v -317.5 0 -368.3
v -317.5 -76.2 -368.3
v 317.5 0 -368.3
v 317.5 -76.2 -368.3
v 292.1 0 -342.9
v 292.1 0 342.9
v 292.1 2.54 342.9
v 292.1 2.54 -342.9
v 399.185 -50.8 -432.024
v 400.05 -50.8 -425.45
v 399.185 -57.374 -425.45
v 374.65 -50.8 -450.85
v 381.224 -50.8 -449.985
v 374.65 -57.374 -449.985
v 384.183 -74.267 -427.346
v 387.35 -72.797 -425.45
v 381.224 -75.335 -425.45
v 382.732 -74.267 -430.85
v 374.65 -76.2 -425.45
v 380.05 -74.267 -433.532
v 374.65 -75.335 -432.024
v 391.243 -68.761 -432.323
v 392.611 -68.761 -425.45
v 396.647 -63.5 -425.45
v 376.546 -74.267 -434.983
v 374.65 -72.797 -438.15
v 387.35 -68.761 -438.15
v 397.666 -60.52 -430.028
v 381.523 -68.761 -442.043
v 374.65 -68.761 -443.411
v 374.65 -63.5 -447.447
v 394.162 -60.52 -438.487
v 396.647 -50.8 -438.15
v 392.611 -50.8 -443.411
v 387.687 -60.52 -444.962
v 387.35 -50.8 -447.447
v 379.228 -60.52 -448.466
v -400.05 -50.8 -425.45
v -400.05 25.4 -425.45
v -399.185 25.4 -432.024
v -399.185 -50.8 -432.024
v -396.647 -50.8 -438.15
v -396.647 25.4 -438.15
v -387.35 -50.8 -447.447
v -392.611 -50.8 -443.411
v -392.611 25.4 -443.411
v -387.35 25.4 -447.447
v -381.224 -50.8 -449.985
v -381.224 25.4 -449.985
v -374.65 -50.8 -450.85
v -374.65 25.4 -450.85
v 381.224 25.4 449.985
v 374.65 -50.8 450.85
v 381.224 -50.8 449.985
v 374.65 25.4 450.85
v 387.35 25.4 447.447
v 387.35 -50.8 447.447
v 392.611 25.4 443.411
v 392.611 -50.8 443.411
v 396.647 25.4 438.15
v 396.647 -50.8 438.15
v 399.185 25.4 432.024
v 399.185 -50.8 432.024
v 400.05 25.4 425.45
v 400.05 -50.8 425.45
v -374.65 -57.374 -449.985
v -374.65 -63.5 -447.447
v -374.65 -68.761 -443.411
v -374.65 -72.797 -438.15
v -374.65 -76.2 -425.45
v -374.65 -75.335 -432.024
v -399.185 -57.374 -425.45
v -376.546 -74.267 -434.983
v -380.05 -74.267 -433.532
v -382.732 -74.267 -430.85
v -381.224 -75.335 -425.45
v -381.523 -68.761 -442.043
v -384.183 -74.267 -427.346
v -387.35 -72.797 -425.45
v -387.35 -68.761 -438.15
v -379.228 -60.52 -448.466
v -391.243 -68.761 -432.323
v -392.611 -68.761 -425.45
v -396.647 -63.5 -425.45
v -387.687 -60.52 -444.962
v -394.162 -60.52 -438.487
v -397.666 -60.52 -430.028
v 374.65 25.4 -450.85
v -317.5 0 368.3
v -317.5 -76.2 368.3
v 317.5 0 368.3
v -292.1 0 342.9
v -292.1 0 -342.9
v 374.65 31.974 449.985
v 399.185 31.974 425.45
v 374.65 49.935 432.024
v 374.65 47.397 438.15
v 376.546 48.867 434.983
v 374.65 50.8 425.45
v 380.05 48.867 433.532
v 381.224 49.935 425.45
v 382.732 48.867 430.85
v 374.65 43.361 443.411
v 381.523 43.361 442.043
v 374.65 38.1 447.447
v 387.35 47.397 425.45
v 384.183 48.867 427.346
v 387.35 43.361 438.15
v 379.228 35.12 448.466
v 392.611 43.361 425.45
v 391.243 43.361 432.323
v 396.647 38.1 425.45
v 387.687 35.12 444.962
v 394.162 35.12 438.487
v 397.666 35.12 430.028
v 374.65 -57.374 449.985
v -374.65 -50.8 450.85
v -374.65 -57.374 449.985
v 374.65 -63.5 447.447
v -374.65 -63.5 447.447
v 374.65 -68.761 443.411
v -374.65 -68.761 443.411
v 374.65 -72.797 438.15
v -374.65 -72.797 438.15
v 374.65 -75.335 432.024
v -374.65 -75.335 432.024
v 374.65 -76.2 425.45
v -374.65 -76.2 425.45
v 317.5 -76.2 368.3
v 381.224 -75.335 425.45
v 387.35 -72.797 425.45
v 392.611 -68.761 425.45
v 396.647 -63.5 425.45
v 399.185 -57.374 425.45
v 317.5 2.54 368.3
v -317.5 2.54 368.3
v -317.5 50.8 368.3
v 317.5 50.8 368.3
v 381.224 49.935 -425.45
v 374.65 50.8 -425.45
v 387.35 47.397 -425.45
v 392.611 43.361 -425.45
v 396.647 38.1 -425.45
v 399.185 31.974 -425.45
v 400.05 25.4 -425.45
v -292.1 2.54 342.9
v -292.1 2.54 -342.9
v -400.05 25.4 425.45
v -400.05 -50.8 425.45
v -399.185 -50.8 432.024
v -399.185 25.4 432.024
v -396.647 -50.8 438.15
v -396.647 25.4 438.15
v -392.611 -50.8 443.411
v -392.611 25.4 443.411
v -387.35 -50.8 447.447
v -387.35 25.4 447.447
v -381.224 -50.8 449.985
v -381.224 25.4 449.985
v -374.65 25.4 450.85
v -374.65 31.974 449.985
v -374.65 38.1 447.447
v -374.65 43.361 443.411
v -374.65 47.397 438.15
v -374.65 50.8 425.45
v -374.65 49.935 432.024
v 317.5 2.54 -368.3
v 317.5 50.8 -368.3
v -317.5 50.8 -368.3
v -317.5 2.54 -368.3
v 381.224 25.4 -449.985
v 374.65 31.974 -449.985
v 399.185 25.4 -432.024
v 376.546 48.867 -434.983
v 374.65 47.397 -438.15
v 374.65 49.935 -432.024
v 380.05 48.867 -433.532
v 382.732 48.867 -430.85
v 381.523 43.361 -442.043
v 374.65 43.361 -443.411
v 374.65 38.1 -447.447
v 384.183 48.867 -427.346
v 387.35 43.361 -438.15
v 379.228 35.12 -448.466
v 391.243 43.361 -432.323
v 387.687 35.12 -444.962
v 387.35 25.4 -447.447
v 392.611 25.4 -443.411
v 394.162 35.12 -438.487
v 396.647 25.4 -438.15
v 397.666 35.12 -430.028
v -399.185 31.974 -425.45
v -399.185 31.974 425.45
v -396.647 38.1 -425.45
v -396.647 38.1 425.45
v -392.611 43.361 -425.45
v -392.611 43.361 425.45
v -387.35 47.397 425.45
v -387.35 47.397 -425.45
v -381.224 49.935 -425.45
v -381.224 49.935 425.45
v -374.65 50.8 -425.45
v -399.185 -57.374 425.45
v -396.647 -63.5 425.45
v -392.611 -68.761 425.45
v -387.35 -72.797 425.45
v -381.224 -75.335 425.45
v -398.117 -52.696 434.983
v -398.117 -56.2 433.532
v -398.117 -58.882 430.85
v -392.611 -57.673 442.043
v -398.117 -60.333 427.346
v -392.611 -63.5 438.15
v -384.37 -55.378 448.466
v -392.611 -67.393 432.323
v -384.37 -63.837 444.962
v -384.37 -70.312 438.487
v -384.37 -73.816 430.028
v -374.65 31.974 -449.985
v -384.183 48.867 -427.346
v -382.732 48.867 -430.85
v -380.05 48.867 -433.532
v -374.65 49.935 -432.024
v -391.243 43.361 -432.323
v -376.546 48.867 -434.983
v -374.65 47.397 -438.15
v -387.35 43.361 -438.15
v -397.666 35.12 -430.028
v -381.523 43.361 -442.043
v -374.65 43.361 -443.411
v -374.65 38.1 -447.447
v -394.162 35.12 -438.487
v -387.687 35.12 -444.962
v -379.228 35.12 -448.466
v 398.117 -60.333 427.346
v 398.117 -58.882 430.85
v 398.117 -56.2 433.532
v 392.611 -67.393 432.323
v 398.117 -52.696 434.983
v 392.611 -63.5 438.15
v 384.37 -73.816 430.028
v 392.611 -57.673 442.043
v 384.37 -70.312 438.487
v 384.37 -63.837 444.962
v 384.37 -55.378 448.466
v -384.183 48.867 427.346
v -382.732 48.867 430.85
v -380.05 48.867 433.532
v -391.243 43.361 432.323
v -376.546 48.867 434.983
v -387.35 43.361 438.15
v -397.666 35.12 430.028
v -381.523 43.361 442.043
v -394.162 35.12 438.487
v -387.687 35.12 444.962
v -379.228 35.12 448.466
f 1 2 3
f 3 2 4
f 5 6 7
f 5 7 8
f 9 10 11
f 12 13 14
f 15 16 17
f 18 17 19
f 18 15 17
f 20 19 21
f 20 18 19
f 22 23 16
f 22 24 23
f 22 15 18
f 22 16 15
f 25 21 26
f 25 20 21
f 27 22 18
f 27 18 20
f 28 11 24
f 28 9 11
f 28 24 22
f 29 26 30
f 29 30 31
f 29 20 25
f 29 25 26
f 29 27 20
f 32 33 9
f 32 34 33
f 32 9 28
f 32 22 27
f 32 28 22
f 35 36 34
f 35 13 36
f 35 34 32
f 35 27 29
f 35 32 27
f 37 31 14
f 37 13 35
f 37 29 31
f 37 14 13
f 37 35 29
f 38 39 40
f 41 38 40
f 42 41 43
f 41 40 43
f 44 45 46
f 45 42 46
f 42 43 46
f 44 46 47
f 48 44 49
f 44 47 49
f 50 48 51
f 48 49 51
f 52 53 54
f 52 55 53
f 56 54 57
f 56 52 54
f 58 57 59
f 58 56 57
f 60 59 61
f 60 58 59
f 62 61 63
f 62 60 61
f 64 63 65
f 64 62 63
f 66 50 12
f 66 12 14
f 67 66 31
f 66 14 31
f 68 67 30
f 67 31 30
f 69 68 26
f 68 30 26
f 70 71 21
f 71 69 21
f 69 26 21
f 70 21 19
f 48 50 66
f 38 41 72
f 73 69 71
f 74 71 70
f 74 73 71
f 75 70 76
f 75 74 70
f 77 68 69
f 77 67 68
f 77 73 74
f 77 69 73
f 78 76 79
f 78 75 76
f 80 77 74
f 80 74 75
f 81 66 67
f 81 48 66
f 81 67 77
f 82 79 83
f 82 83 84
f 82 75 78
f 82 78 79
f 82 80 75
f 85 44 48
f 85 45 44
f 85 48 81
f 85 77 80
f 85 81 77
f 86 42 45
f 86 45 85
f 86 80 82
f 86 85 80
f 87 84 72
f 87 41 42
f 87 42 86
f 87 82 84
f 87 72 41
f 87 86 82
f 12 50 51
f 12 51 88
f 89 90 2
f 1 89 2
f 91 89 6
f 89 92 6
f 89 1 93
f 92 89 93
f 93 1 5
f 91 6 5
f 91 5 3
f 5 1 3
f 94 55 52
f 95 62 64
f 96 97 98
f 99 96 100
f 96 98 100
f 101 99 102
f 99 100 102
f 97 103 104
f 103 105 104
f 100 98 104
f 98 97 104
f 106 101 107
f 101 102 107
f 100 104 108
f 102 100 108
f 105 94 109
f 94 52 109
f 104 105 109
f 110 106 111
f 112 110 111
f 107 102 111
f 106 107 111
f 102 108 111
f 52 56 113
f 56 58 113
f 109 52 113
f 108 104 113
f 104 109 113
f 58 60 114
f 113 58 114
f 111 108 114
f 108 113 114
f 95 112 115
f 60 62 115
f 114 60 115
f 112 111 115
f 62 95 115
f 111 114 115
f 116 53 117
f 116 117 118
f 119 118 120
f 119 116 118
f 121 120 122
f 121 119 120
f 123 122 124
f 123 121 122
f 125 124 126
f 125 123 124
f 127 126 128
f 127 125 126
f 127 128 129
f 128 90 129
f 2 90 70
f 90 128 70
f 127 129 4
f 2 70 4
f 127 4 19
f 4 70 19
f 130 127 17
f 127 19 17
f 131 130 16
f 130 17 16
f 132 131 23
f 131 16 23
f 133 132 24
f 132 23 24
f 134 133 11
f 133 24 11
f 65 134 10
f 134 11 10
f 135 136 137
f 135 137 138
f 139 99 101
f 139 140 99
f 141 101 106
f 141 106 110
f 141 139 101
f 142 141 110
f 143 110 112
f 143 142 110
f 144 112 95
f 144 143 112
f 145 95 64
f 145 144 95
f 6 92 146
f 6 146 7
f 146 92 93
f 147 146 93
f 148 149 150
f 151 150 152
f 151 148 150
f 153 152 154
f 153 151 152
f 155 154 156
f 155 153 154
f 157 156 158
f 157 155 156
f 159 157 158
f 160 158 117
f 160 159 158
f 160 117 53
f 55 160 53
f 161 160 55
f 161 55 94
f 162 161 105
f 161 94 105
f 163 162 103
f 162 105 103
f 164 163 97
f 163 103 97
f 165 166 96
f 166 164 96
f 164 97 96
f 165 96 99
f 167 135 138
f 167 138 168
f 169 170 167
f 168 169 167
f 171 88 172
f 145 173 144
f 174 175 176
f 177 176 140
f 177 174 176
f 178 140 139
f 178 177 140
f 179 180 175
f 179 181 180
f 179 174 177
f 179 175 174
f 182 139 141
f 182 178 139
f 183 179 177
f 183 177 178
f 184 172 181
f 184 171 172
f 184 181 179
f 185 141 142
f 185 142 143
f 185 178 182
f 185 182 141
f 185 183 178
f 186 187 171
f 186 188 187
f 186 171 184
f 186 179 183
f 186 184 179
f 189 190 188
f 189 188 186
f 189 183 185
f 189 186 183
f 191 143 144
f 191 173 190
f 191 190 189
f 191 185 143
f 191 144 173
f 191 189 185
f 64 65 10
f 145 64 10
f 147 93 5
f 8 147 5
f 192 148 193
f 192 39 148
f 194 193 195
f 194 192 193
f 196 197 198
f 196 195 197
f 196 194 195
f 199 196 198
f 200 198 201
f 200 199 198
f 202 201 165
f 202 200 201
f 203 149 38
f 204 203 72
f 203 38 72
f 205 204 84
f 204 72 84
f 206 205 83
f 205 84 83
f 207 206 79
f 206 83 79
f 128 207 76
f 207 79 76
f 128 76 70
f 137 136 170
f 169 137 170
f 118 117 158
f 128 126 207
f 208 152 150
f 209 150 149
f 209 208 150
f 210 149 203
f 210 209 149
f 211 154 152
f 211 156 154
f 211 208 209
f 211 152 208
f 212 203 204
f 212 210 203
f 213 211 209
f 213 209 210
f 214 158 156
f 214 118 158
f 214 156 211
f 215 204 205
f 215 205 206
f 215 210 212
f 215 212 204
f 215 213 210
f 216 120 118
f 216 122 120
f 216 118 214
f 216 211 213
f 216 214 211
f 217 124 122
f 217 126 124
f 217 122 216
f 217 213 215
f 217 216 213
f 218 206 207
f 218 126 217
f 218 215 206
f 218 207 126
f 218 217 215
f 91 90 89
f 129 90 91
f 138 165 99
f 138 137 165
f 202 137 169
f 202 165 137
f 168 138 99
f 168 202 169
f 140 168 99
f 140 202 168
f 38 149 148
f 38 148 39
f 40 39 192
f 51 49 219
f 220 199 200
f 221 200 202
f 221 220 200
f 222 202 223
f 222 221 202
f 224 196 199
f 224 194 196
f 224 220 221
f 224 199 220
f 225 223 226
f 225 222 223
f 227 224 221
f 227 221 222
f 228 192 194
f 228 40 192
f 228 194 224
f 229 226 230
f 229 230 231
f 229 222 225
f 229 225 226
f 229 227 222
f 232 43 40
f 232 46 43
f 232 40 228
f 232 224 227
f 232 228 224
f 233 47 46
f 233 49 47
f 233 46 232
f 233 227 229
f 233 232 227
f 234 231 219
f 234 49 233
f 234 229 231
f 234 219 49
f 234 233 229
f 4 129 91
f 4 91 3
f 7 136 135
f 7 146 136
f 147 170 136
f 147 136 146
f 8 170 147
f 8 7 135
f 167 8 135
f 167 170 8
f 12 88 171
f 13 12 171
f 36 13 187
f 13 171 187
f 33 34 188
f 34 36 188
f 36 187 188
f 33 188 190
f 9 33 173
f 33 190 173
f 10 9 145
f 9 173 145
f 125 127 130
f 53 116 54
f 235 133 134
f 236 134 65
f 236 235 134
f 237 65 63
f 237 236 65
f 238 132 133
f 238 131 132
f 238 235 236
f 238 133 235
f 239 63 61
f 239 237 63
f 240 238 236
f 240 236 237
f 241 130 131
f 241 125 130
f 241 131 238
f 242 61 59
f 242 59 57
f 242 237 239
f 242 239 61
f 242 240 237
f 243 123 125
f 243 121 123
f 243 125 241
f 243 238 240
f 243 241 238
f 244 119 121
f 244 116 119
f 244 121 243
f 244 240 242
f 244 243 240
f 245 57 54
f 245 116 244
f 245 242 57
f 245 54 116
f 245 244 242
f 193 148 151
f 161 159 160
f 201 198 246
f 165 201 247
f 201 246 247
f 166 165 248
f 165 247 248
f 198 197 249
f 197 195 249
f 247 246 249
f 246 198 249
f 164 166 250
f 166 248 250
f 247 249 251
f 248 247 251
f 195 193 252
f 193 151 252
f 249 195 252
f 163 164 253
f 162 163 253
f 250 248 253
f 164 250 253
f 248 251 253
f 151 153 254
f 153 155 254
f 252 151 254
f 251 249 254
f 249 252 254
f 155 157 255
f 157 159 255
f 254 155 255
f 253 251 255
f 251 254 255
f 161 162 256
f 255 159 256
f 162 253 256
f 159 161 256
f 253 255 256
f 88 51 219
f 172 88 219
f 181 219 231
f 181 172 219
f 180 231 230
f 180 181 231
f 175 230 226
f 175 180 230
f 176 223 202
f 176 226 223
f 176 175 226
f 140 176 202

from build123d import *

# Parameters (mm, degrees)
BOSS_EXTRUDE1_DEPTH      = 50.8
BOSS_EXTRUDE1_DEPTH_BACK = 76.2
SKETCH1_W                = 800.1
SKETCH1_H                = 901.7
SKETCH1_W_2              = 635
SKETCH1_H_2              = 736.6
SKETCH1_3_W              = 635
SKETCH1_3_H              = 736.6
SKETCH1_3_W_2            = 584.2
SKETCH1_3_H_2            = 685.8
BOSS_EXTRUDE2_DEPTH      = 2.54
FILLET1_R                = 25.4


with BuildPart() as part:
    # Sketch1 → Boss-Extrude1 (new, two sides: drawn at the far end of the back side and taken through both)
    with BuildSketch(Plane(origin=(0, 0, 0), x_dir=(1, 0, 0), z_dir=(0, 1, 0)).offset(-BOSS_EXTRUDE1_DEPTH_BACK)):
        Rectangle(SKETCH1_W, SKETCH1_H)
        Rectangle(SKETCH1_W_2, SKETCH1_H_2, mode=Mode.SUBTRACT)
    extrude(amount=BOSS_EXTRUDE1_DEPTH + BOSS_EXTRUDE1_DEPTH_BACK)

    # Sketch1<3> → Boss-Extrude2 (add)
    with BuildSketch(Plane(origin=(0, 0, 0), x_dir=(1, 0, 0), z_dir=(0, 1, 0))):
        Rectangle(SKETCH1_3_W, SKETCH1_3_H)
        Rectangle(SKETCH1_3_W_2, SKETCH1_3_H_2, mode=Mode.SUBTRACT)
    extrude(amount=BOSS_EXTRUDE2_DEPTH)

    # Fillet1
    fillet1_edges = [part.edges().sort_by_distance(p)[0] for p in [
        (0, -76.2, 450.85),
        (-400.05, -12.7, -450.85),
        (400.05, -12.7, -450.85),
        (400.05, -76.2, 0),
        (400.05, -12.7, 450.85),
        (-400.05, -12.7, 450.85),
        (0, -76.2, -450.85),
        (-400.05, 50.8, 0),
        (0, 50.8, -450.85),
        (0, 50.8, 450.85),
        (400.05, 50.8, 0),
        (-400.05, -76.2, 0),
    ]]
    fillet(fillet1_edges, radius=FILLET1_R)


solid = part.part
